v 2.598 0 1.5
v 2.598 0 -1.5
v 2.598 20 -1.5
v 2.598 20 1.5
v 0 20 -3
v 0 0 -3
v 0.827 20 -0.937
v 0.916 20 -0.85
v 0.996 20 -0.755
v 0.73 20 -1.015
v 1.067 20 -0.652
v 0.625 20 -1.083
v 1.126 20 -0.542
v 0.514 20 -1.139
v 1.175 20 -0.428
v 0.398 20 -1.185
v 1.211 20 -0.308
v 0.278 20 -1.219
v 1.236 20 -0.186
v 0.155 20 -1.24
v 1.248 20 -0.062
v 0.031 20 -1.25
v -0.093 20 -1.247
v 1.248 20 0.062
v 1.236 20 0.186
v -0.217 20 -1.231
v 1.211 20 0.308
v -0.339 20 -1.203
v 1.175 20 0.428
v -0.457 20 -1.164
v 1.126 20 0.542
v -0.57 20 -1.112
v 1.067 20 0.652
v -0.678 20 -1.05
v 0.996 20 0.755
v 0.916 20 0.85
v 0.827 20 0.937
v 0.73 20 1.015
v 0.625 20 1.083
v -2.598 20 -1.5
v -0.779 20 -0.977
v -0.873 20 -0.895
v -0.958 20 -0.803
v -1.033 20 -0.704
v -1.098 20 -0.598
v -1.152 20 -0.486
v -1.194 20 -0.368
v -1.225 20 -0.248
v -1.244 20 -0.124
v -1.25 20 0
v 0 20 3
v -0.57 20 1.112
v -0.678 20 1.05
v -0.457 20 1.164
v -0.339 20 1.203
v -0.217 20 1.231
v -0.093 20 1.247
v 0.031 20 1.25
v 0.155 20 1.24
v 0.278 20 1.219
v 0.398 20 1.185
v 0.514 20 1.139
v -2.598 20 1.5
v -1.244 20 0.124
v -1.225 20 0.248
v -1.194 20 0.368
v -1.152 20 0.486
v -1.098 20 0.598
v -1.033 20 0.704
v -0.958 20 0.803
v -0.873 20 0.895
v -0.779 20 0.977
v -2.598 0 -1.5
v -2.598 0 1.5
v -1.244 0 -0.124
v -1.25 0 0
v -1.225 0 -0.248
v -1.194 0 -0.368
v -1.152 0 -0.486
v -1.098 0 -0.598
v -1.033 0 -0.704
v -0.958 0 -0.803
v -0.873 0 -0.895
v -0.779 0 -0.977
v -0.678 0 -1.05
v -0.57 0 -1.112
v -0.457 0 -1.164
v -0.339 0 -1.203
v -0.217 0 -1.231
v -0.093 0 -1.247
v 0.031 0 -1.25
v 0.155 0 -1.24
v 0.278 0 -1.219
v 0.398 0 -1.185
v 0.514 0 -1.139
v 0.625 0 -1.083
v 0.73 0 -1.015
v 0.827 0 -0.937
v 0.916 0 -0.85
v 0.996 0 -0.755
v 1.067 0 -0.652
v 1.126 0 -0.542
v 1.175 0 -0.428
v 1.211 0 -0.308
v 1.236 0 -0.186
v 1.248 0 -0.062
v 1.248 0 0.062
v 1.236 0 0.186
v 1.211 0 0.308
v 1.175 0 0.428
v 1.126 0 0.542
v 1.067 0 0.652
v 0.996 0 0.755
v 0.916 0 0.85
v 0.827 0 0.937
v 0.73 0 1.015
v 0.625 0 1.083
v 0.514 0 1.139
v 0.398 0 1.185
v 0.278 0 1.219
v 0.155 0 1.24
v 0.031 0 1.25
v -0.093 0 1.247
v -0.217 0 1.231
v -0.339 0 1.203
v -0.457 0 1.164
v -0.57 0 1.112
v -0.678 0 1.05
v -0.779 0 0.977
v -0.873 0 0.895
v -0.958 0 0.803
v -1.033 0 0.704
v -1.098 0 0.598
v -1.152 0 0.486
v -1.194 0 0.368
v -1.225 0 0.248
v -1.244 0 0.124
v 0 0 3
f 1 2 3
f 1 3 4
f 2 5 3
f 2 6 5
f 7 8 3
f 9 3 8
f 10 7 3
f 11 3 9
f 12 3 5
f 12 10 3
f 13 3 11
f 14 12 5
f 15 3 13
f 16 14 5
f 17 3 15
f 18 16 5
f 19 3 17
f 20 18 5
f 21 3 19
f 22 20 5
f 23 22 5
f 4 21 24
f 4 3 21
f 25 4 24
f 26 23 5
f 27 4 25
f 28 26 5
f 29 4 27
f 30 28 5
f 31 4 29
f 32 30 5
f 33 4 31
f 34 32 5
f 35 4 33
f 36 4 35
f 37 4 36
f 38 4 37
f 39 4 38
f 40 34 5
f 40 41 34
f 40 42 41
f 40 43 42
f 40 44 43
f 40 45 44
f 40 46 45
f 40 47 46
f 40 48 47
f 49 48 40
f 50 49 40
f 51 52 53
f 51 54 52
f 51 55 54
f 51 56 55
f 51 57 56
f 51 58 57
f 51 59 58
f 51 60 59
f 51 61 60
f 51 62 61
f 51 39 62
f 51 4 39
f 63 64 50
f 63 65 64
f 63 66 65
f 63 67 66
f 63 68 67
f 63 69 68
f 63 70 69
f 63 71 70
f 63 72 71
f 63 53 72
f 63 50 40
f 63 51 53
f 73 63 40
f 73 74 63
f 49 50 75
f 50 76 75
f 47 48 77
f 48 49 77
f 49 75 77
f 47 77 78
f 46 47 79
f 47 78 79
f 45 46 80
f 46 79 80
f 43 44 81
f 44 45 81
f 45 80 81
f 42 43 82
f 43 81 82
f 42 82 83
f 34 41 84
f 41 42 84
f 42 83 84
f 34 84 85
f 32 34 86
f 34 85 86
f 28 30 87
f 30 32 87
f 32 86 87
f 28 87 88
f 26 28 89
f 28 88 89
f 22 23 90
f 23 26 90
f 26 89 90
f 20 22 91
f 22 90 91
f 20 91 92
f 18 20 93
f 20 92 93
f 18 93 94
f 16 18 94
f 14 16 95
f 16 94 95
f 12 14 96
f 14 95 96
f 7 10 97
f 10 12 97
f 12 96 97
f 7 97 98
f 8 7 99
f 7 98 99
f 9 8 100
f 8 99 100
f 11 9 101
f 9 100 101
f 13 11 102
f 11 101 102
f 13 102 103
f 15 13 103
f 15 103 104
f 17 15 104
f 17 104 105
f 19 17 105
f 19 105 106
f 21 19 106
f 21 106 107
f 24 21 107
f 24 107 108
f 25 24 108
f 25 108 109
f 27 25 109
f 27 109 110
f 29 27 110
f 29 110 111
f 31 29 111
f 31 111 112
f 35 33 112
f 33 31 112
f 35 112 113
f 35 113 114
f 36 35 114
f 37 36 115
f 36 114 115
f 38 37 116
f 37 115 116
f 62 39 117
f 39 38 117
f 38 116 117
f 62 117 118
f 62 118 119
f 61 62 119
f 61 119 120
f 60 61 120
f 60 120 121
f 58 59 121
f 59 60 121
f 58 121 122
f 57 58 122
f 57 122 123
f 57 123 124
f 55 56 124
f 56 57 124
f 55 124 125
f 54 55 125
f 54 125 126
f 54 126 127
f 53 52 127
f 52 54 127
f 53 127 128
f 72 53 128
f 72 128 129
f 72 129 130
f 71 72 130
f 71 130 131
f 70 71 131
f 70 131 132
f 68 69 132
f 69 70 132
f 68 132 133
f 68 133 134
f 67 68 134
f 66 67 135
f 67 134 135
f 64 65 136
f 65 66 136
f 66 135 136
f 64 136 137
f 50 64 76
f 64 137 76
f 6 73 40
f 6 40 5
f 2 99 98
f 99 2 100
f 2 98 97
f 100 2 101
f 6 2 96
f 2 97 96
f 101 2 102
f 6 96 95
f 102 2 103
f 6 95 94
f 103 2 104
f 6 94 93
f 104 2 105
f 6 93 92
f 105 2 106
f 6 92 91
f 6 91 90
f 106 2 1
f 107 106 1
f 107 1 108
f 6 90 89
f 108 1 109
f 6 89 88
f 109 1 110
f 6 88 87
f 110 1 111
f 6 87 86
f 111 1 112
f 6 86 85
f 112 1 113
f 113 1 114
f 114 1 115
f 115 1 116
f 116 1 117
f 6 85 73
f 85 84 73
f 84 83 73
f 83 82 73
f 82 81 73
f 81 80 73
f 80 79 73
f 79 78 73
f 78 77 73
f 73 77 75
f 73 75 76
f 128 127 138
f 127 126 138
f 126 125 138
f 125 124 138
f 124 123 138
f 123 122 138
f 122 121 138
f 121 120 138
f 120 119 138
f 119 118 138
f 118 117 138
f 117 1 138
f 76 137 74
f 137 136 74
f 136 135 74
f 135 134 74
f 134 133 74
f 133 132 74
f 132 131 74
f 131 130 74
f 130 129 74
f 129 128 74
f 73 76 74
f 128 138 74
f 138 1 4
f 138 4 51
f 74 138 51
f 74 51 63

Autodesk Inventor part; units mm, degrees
ref_plane "YZ Plane" through (0, 0, 0) normal (1, 0, 0) x (0, 1, 0)
ref_plane "XZ Plane" through (0, 0, 0) normal (0, 1, 0) x (-1, 0, 0)
ref_plane "XY Plane" through (0, 0, 0) normal (0, 0, 1) x (1, 0, 0)
sketch "Sketch1" plane through (0, 0, 0) normal (0, 1, 0) x (-1, 0, 0)
  circle A0 centre (0, 0) radius 1.25
  line L0 (0, -3) -> (-2.5981, -1.5)
  line L1 (-2.5981, -1.5) -> (-2.5981, 1.5)
  line L2 (-2.5981, 1.5) -> (0, 3)
  line L3 (0, 3) -> (2.5981, 1.5)
  line L4 (2.5981, 1.5) -> (2.5981, -1.5)
  line L5 (2.5981, -1.5) -> (0, -3)
  dimension "d0" = 2.5
extrude "Extrusion1" add sketch "Sketch1" along normal blind 20
properties part number "Standoff-Hex-20mm"
